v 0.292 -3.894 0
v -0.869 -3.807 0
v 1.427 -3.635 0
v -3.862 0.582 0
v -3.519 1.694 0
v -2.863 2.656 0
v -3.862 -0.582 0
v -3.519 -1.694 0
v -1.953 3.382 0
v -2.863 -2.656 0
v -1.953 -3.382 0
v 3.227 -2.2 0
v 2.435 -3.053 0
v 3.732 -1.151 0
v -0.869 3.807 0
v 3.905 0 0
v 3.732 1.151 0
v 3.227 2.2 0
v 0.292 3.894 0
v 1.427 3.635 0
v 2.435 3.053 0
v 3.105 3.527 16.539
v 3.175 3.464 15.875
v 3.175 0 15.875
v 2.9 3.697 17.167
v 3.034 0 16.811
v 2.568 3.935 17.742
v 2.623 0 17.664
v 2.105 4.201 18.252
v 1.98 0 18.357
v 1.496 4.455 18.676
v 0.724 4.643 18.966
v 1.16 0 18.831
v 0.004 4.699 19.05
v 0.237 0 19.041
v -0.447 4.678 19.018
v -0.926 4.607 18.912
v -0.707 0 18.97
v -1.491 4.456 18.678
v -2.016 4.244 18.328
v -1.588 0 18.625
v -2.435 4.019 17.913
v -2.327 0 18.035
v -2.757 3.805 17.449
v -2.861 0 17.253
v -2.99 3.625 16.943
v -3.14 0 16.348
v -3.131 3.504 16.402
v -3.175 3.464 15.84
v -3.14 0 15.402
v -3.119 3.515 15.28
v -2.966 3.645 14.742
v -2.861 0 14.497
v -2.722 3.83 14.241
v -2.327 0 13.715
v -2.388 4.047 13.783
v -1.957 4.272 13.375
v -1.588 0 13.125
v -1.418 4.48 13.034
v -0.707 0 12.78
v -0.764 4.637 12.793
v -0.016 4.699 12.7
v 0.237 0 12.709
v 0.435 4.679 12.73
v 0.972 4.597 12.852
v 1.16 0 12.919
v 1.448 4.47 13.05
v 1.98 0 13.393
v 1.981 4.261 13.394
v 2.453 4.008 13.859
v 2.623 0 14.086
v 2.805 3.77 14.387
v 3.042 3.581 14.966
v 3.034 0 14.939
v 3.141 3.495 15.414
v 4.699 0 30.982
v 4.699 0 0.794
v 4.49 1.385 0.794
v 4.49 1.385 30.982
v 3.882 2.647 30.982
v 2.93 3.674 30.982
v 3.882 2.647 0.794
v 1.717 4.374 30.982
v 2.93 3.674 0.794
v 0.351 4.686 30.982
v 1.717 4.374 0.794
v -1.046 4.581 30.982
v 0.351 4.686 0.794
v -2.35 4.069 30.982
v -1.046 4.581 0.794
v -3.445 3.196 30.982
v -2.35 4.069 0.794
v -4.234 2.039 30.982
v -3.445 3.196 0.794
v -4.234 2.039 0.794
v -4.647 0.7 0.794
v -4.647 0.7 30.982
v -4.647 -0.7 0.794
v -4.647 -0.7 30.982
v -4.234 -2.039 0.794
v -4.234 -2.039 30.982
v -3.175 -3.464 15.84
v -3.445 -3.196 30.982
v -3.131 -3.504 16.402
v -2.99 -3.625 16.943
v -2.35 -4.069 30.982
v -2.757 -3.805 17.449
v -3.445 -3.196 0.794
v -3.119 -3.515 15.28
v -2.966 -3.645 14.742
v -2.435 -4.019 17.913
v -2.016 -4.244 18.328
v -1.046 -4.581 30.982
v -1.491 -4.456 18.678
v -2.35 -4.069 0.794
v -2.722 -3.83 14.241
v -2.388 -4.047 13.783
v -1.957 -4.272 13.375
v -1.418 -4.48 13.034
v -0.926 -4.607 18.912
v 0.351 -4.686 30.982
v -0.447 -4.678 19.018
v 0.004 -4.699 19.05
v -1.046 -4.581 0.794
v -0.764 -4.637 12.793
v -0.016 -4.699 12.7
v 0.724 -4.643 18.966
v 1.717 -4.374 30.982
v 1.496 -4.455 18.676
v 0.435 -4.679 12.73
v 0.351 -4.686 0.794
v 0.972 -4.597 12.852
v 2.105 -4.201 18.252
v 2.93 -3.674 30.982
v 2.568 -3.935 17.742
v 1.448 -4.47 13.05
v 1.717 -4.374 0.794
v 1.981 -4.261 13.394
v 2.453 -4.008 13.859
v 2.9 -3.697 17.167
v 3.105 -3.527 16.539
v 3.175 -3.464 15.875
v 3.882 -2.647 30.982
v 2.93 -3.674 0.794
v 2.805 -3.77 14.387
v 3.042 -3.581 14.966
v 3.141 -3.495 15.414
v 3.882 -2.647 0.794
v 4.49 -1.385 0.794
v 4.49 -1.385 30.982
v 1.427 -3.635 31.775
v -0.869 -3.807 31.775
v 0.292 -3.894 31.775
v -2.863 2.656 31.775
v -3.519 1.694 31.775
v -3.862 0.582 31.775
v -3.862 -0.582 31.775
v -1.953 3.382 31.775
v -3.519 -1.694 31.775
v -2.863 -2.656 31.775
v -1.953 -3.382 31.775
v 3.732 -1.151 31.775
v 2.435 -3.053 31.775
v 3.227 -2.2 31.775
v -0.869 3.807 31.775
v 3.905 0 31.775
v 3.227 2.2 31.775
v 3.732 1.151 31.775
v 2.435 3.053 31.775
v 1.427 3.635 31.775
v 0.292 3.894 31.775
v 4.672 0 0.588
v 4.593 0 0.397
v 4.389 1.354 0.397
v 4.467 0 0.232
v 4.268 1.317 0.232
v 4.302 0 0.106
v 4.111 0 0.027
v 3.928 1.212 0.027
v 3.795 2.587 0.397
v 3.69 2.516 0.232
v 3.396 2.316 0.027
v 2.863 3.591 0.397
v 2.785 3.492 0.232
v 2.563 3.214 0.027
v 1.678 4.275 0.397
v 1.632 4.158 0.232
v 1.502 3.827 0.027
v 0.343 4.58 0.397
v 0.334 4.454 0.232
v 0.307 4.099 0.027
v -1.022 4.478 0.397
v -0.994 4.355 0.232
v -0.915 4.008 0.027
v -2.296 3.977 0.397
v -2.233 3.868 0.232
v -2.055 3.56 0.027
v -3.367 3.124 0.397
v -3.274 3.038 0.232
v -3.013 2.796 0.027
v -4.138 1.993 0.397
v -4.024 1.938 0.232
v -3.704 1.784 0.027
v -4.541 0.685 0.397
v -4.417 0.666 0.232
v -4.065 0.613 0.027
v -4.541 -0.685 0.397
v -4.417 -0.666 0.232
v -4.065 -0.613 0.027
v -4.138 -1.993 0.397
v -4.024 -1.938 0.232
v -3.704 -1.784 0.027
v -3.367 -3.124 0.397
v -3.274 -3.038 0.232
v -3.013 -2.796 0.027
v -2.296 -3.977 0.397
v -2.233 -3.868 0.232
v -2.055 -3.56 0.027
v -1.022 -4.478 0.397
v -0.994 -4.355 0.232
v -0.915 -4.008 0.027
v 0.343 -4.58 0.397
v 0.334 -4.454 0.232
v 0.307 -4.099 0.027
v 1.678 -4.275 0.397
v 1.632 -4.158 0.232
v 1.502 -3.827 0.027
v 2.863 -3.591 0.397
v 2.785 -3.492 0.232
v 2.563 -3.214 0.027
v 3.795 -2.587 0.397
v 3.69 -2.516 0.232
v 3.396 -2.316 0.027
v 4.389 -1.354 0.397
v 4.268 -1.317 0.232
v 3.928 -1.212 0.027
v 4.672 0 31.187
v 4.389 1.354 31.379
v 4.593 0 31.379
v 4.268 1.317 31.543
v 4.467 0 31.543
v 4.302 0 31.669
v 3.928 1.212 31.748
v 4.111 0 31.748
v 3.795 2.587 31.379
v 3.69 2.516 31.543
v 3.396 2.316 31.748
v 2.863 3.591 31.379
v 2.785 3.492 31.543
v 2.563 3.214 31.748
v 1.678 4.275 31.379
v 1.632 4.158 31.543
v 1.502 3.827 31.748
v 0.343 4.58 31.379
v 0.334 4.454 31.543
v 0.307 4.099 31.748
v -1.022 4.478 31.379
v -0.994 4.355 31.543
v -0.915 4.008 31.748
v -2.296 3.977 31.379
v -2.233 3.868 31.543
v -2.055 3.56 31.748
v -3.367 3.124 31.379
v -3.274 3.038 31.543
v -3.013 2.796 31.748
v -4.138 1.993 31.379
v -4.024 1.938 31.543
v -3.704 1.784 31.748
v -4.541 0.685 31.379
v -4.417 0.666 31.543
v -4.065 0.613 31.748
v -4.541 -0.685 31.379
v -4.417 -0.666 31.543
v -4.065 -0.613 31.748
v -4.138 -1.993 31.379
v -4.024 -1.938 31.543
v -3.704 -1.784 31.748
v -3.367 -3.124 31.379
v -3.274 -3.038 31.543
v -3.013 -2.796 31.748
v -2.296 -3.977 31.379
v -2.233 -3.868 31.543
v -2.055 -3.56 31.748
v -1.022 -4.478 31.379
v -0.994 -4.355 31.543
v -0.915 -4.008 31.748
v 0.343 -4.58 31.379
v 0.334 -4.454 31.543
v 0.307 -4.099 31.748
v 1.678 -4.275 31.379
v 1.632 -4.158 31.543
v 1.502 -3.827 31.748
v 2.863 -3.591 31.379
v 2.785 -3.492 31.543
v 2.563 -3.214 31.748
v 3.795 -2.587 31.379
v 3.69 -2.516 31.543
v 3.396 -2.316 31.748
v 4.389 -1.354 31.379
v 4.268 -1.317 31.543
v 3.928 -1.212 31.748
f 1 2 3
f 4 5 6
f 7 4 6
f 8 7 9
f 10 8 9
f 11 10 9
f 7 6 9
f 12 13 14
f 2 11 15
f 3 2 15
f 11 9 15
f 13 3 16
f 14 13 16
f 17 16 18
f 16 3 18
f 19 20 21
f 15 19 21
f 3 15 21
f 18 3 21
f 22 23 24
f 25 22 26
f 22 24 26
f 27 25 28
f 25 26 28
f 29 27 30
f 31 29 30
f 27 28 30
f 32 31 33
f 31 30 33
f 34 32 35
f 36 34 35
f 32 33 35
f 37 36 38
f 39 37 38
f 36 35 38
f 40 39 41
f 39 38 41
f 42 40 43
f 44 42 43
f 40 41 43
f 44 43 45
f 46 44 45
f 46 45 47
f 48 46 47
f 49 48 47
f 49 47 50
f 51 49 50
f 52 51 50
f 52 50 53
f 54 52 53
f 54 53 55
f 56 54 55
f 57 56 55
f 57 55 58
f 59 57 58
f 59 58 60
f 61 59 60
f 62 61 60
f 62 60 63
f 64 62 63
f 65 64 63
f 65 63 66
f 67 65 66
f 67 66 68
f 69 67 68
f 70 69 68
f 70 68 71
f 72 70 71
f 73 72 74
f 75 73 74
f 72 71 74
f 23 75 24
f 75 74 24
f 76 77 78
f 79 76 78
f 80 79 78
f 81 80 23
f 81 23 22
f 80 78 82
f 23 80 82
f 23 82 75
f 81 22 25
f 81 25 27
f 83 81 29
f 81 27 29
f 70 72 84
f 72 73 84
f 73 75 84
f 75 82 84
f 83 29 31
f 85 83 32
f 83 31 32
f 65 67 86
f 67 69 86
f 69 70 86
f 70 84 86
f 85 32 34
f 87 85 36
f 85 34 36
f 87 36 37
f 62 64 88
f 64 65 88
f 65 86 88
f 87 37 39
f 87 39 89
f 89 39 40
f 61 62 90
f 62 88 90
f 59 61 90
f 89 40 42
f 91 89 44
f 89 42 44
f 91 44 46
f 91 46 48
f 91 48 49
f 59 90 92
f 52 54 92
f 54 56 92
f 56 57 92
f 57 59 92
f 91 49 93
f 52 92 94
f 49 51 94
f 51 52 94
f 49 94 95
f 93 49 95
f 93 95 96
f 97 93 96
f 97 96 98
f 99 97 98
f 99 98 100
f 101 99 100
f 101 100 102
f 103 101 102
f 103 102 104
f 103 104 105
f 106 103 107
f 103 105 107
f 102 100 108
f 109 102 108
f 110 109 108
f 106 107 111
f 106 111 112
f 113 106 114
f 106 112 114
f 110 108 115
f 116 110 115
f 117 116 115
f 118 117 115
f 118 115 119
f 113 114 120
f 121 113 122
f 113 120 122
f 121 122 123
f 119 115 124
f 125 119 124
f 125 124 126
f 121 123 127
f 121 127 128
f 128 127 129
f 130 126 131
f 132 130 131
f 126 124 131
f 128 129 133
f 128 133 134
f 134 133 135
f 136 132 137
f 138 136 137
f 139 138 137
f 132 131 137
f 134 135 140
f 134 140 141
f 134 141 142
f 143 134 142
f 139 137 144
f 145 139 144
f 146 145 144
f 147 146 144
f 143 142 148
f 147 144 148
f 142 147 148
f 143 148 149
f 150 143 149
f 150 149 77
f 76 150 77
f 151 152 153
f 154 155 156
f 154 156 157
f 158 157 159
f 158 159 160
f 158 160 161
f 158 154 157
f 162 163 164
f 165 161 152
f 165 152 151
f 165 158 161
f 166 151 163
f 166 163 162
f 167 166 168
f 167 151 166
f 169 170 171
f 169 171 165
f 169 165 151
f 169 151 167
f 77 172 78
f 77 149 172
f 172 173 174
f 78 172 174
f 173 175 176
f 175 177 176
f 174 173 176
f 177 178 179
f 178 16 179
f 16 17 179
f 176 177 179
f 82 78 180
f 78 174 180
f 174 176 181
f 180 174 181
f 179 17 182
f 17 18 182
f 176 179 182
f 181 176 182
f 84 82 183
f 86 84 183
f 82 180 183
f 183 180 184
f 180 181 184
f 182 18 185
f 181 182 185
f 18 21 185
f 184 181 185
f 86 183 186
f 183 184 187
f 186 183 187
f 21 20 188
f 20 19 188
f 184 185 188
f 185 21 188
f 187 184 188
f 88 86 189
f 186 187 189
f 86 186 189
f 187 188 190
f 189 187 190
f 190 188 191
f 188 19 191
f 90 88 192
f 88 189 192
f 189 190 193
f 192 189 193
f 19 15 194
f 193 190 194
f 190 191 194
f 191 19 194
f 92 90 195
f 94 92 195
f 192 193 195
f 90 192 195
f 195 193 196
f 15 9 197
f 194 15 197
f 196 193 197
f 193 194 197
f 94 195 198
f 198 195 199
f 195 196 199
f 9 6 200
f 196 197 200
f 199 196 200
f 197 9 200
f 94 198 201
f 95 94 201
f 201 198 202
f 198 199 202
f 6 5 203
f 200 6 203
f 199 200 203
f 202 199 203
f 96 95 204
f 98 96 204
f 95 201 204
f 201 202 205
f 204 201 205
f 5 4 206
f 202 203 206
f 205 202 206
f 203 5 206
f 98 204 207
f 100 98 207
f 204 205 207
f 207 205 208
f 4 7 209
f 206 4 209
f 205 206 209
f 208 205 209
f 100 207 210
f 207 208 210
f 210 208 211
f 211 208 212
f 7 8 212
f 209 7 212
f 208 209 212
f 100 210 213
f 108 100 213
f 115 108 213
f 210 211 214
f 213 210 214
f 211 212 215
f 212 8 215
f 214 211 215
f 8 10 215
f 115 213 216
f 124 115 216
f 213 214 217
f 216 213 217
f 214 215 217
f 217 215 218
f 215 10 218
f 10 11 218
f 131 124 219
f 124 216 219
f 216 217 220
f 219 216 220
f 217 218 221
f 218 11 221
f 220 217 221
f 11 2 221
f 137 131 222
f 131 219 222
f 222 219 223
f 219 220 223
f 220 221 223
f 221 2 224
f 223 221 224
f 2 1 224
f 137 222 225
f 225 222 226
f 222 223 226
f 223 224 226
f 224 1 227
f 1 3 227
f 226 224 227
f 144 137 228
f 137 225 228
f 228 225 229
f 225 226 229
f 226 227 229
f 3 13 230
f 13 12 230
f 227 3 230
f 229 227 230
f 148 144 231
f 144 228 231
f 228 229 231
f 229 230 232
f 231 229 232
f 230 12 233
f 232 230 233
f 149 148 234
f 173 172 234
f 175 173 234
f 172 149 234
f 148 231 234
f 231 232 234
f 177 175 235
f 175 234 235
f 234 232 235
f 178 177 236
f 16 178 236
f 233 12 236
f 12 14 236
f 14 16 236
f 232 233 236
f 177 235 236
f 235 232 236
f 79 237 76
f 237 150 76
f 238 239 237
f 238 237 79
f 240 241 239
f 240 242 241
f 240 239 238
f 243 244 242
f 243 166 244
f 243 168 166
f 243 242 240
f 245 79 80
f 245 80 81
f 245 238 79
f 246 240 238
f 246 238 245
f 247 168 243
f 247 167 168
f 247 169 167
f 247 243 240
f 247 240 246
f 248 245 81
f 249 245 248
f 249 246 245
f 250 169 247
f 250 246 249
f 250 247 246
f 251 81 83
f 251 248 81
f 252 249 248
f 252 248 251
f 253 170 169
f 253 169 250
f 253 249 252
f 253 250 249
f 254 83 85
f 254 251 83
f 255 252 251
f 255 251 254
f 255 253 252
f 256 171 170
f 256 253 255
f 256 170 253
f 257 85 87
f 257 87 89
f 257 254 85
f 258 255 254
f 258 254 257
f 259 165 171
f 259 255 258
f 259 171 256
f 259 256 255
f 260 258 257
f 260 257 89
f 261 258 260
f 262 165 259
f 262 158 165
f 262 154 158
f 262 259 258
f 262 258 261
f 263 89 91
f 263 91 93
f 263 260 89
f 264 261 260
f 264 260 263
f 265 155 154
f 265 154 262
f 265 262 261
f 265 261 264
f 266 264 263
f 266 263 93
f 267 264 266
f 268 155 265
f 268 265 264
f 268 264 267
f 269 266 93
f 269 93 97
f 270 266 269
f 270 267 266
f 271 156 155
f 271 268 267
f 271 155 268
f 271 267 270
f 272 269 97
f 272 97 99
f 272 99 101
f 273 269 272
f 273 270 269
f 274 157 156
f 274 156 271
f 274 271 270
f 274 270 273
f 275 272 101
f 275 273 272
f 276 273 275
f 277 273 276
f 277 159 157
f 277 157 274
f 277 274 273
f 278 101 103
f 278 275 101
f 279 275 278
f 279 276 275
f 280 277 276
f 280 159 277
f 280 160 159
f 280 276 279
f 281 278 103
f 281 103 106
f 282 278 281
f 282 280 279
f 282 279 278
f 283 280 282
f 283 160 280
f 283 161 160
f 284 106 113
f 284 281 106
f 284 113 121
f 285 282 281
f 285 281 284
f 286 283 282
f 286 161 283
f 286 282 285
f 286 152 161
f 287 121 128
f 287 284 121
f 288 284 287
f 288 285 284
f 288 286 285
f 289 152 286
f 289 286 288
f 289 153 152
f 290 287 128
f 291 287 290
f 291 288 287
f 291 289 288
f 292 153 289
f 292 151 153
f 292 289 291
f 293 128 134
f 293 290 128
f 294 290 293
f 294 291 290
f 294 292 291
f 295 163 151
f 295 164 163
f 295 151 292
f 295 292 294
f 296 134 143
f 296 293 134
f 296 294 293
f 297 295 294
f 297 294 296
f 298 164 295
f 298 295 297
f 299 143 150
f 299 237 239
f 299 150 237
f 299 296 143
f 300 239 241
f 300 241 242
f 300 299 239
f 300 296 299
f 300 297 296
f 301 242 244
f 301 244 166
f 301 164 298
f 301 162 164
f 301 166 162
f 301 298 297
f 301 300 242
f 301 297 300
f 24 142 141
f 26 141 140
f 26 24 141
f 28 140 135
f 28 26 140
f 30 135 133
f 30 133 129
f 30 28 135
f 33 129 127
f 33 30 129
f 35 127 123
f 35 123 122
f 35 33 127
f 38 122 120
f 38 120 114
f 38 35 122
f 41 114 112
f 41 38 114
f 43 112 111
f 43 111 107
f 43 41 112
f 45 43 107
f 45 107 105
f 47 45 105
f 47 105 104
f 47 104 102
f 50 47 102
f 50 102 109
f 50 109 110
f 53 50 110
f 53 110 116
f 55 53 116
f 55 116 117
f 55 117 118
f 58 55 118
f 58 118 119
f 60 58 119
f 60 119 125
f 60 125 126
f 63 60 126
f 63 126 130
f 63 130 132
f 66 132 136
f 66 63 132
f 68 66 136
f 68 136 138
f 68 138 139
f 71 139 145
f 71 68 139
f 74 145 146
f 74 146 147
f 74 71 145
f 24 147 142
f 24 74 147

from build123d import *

# Parameters (mm, degrees)
F0_R          = 4.699
F1_DEPTH      = 31.7754
F2_R          = 3.175
F3_DEPTH      = 14.986
F3_DEPTH_BACK = 25.4
F4_R          = 0.79375


with BuildPart() as f1:
    # F0 (on Top) → F1 (new body)
    with BuildSketch(Plane.XY):
        Circle(F0_R)
    extrude(amount=F1_DEPTH)

    # F2 (on Front) → F3 (cut, two sides)
    with BuildSketch(Plane.XZ) as f3_sk:
        with Locations((0, 15.875)):
            Circle(F2_R)
    extrude(amount=-F3_DEPTH, mode=Mode.SUBTRACT)
    extrude(f3_sk.sketch, amount=F3_DEPTH_BACK, mode=Mode.SUBTRACT)

    # F4
    f4_edges = [f1.edges().sort_by_distance(p)[0] for p in [
        (-4.699, 0, 31.7754),
        (-4.699, 0, 0),
    ]]
    fillet(f4_edges, radius=F4_R)


solid = f1.part
